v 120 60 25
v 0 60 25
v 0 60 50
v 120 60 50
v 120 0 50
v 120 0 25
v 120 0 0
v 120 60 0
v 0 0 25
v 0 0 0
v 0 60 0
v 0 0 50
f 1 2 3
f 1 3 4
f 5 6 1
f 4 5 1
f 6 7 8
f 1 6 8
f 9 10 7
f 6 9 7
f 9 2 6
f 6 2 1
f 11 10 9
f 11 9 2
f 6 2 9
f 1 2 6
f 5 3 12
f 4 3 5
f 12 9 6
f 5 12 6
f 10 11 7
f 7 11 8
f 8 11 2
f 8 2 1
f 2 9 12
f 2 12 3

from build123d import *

# Parameters (mm, degrees)
F0_W     = 120
F0_H     = 60
F1_DEPTH = 25
F3_DEPTH = 25


# Not quite as in the source:
# - the program builds the solid bodies; features that only make, move or delete a surface that nothing else refers to are left out


with BuildPart() as f1:
    # F0 (on Top) → F1 (new body)
    with BuildSketch(Plane.XY):
        with Locations((60, 30)):
            Rectangle(F0_W, F0_H)
    extrude(amount=F1_DEPTH)


with BuildPart() as f3:
    # F3 (new): a face of the model
    f3_faces = [f1.part.faces().sort_by_distance(p)[0] for p in [
        (60, 30, 25),
    ]]
    extrude(f3_faces, amount=F3_DEPTH)


solid = Compound([f1.part, f3.part])
